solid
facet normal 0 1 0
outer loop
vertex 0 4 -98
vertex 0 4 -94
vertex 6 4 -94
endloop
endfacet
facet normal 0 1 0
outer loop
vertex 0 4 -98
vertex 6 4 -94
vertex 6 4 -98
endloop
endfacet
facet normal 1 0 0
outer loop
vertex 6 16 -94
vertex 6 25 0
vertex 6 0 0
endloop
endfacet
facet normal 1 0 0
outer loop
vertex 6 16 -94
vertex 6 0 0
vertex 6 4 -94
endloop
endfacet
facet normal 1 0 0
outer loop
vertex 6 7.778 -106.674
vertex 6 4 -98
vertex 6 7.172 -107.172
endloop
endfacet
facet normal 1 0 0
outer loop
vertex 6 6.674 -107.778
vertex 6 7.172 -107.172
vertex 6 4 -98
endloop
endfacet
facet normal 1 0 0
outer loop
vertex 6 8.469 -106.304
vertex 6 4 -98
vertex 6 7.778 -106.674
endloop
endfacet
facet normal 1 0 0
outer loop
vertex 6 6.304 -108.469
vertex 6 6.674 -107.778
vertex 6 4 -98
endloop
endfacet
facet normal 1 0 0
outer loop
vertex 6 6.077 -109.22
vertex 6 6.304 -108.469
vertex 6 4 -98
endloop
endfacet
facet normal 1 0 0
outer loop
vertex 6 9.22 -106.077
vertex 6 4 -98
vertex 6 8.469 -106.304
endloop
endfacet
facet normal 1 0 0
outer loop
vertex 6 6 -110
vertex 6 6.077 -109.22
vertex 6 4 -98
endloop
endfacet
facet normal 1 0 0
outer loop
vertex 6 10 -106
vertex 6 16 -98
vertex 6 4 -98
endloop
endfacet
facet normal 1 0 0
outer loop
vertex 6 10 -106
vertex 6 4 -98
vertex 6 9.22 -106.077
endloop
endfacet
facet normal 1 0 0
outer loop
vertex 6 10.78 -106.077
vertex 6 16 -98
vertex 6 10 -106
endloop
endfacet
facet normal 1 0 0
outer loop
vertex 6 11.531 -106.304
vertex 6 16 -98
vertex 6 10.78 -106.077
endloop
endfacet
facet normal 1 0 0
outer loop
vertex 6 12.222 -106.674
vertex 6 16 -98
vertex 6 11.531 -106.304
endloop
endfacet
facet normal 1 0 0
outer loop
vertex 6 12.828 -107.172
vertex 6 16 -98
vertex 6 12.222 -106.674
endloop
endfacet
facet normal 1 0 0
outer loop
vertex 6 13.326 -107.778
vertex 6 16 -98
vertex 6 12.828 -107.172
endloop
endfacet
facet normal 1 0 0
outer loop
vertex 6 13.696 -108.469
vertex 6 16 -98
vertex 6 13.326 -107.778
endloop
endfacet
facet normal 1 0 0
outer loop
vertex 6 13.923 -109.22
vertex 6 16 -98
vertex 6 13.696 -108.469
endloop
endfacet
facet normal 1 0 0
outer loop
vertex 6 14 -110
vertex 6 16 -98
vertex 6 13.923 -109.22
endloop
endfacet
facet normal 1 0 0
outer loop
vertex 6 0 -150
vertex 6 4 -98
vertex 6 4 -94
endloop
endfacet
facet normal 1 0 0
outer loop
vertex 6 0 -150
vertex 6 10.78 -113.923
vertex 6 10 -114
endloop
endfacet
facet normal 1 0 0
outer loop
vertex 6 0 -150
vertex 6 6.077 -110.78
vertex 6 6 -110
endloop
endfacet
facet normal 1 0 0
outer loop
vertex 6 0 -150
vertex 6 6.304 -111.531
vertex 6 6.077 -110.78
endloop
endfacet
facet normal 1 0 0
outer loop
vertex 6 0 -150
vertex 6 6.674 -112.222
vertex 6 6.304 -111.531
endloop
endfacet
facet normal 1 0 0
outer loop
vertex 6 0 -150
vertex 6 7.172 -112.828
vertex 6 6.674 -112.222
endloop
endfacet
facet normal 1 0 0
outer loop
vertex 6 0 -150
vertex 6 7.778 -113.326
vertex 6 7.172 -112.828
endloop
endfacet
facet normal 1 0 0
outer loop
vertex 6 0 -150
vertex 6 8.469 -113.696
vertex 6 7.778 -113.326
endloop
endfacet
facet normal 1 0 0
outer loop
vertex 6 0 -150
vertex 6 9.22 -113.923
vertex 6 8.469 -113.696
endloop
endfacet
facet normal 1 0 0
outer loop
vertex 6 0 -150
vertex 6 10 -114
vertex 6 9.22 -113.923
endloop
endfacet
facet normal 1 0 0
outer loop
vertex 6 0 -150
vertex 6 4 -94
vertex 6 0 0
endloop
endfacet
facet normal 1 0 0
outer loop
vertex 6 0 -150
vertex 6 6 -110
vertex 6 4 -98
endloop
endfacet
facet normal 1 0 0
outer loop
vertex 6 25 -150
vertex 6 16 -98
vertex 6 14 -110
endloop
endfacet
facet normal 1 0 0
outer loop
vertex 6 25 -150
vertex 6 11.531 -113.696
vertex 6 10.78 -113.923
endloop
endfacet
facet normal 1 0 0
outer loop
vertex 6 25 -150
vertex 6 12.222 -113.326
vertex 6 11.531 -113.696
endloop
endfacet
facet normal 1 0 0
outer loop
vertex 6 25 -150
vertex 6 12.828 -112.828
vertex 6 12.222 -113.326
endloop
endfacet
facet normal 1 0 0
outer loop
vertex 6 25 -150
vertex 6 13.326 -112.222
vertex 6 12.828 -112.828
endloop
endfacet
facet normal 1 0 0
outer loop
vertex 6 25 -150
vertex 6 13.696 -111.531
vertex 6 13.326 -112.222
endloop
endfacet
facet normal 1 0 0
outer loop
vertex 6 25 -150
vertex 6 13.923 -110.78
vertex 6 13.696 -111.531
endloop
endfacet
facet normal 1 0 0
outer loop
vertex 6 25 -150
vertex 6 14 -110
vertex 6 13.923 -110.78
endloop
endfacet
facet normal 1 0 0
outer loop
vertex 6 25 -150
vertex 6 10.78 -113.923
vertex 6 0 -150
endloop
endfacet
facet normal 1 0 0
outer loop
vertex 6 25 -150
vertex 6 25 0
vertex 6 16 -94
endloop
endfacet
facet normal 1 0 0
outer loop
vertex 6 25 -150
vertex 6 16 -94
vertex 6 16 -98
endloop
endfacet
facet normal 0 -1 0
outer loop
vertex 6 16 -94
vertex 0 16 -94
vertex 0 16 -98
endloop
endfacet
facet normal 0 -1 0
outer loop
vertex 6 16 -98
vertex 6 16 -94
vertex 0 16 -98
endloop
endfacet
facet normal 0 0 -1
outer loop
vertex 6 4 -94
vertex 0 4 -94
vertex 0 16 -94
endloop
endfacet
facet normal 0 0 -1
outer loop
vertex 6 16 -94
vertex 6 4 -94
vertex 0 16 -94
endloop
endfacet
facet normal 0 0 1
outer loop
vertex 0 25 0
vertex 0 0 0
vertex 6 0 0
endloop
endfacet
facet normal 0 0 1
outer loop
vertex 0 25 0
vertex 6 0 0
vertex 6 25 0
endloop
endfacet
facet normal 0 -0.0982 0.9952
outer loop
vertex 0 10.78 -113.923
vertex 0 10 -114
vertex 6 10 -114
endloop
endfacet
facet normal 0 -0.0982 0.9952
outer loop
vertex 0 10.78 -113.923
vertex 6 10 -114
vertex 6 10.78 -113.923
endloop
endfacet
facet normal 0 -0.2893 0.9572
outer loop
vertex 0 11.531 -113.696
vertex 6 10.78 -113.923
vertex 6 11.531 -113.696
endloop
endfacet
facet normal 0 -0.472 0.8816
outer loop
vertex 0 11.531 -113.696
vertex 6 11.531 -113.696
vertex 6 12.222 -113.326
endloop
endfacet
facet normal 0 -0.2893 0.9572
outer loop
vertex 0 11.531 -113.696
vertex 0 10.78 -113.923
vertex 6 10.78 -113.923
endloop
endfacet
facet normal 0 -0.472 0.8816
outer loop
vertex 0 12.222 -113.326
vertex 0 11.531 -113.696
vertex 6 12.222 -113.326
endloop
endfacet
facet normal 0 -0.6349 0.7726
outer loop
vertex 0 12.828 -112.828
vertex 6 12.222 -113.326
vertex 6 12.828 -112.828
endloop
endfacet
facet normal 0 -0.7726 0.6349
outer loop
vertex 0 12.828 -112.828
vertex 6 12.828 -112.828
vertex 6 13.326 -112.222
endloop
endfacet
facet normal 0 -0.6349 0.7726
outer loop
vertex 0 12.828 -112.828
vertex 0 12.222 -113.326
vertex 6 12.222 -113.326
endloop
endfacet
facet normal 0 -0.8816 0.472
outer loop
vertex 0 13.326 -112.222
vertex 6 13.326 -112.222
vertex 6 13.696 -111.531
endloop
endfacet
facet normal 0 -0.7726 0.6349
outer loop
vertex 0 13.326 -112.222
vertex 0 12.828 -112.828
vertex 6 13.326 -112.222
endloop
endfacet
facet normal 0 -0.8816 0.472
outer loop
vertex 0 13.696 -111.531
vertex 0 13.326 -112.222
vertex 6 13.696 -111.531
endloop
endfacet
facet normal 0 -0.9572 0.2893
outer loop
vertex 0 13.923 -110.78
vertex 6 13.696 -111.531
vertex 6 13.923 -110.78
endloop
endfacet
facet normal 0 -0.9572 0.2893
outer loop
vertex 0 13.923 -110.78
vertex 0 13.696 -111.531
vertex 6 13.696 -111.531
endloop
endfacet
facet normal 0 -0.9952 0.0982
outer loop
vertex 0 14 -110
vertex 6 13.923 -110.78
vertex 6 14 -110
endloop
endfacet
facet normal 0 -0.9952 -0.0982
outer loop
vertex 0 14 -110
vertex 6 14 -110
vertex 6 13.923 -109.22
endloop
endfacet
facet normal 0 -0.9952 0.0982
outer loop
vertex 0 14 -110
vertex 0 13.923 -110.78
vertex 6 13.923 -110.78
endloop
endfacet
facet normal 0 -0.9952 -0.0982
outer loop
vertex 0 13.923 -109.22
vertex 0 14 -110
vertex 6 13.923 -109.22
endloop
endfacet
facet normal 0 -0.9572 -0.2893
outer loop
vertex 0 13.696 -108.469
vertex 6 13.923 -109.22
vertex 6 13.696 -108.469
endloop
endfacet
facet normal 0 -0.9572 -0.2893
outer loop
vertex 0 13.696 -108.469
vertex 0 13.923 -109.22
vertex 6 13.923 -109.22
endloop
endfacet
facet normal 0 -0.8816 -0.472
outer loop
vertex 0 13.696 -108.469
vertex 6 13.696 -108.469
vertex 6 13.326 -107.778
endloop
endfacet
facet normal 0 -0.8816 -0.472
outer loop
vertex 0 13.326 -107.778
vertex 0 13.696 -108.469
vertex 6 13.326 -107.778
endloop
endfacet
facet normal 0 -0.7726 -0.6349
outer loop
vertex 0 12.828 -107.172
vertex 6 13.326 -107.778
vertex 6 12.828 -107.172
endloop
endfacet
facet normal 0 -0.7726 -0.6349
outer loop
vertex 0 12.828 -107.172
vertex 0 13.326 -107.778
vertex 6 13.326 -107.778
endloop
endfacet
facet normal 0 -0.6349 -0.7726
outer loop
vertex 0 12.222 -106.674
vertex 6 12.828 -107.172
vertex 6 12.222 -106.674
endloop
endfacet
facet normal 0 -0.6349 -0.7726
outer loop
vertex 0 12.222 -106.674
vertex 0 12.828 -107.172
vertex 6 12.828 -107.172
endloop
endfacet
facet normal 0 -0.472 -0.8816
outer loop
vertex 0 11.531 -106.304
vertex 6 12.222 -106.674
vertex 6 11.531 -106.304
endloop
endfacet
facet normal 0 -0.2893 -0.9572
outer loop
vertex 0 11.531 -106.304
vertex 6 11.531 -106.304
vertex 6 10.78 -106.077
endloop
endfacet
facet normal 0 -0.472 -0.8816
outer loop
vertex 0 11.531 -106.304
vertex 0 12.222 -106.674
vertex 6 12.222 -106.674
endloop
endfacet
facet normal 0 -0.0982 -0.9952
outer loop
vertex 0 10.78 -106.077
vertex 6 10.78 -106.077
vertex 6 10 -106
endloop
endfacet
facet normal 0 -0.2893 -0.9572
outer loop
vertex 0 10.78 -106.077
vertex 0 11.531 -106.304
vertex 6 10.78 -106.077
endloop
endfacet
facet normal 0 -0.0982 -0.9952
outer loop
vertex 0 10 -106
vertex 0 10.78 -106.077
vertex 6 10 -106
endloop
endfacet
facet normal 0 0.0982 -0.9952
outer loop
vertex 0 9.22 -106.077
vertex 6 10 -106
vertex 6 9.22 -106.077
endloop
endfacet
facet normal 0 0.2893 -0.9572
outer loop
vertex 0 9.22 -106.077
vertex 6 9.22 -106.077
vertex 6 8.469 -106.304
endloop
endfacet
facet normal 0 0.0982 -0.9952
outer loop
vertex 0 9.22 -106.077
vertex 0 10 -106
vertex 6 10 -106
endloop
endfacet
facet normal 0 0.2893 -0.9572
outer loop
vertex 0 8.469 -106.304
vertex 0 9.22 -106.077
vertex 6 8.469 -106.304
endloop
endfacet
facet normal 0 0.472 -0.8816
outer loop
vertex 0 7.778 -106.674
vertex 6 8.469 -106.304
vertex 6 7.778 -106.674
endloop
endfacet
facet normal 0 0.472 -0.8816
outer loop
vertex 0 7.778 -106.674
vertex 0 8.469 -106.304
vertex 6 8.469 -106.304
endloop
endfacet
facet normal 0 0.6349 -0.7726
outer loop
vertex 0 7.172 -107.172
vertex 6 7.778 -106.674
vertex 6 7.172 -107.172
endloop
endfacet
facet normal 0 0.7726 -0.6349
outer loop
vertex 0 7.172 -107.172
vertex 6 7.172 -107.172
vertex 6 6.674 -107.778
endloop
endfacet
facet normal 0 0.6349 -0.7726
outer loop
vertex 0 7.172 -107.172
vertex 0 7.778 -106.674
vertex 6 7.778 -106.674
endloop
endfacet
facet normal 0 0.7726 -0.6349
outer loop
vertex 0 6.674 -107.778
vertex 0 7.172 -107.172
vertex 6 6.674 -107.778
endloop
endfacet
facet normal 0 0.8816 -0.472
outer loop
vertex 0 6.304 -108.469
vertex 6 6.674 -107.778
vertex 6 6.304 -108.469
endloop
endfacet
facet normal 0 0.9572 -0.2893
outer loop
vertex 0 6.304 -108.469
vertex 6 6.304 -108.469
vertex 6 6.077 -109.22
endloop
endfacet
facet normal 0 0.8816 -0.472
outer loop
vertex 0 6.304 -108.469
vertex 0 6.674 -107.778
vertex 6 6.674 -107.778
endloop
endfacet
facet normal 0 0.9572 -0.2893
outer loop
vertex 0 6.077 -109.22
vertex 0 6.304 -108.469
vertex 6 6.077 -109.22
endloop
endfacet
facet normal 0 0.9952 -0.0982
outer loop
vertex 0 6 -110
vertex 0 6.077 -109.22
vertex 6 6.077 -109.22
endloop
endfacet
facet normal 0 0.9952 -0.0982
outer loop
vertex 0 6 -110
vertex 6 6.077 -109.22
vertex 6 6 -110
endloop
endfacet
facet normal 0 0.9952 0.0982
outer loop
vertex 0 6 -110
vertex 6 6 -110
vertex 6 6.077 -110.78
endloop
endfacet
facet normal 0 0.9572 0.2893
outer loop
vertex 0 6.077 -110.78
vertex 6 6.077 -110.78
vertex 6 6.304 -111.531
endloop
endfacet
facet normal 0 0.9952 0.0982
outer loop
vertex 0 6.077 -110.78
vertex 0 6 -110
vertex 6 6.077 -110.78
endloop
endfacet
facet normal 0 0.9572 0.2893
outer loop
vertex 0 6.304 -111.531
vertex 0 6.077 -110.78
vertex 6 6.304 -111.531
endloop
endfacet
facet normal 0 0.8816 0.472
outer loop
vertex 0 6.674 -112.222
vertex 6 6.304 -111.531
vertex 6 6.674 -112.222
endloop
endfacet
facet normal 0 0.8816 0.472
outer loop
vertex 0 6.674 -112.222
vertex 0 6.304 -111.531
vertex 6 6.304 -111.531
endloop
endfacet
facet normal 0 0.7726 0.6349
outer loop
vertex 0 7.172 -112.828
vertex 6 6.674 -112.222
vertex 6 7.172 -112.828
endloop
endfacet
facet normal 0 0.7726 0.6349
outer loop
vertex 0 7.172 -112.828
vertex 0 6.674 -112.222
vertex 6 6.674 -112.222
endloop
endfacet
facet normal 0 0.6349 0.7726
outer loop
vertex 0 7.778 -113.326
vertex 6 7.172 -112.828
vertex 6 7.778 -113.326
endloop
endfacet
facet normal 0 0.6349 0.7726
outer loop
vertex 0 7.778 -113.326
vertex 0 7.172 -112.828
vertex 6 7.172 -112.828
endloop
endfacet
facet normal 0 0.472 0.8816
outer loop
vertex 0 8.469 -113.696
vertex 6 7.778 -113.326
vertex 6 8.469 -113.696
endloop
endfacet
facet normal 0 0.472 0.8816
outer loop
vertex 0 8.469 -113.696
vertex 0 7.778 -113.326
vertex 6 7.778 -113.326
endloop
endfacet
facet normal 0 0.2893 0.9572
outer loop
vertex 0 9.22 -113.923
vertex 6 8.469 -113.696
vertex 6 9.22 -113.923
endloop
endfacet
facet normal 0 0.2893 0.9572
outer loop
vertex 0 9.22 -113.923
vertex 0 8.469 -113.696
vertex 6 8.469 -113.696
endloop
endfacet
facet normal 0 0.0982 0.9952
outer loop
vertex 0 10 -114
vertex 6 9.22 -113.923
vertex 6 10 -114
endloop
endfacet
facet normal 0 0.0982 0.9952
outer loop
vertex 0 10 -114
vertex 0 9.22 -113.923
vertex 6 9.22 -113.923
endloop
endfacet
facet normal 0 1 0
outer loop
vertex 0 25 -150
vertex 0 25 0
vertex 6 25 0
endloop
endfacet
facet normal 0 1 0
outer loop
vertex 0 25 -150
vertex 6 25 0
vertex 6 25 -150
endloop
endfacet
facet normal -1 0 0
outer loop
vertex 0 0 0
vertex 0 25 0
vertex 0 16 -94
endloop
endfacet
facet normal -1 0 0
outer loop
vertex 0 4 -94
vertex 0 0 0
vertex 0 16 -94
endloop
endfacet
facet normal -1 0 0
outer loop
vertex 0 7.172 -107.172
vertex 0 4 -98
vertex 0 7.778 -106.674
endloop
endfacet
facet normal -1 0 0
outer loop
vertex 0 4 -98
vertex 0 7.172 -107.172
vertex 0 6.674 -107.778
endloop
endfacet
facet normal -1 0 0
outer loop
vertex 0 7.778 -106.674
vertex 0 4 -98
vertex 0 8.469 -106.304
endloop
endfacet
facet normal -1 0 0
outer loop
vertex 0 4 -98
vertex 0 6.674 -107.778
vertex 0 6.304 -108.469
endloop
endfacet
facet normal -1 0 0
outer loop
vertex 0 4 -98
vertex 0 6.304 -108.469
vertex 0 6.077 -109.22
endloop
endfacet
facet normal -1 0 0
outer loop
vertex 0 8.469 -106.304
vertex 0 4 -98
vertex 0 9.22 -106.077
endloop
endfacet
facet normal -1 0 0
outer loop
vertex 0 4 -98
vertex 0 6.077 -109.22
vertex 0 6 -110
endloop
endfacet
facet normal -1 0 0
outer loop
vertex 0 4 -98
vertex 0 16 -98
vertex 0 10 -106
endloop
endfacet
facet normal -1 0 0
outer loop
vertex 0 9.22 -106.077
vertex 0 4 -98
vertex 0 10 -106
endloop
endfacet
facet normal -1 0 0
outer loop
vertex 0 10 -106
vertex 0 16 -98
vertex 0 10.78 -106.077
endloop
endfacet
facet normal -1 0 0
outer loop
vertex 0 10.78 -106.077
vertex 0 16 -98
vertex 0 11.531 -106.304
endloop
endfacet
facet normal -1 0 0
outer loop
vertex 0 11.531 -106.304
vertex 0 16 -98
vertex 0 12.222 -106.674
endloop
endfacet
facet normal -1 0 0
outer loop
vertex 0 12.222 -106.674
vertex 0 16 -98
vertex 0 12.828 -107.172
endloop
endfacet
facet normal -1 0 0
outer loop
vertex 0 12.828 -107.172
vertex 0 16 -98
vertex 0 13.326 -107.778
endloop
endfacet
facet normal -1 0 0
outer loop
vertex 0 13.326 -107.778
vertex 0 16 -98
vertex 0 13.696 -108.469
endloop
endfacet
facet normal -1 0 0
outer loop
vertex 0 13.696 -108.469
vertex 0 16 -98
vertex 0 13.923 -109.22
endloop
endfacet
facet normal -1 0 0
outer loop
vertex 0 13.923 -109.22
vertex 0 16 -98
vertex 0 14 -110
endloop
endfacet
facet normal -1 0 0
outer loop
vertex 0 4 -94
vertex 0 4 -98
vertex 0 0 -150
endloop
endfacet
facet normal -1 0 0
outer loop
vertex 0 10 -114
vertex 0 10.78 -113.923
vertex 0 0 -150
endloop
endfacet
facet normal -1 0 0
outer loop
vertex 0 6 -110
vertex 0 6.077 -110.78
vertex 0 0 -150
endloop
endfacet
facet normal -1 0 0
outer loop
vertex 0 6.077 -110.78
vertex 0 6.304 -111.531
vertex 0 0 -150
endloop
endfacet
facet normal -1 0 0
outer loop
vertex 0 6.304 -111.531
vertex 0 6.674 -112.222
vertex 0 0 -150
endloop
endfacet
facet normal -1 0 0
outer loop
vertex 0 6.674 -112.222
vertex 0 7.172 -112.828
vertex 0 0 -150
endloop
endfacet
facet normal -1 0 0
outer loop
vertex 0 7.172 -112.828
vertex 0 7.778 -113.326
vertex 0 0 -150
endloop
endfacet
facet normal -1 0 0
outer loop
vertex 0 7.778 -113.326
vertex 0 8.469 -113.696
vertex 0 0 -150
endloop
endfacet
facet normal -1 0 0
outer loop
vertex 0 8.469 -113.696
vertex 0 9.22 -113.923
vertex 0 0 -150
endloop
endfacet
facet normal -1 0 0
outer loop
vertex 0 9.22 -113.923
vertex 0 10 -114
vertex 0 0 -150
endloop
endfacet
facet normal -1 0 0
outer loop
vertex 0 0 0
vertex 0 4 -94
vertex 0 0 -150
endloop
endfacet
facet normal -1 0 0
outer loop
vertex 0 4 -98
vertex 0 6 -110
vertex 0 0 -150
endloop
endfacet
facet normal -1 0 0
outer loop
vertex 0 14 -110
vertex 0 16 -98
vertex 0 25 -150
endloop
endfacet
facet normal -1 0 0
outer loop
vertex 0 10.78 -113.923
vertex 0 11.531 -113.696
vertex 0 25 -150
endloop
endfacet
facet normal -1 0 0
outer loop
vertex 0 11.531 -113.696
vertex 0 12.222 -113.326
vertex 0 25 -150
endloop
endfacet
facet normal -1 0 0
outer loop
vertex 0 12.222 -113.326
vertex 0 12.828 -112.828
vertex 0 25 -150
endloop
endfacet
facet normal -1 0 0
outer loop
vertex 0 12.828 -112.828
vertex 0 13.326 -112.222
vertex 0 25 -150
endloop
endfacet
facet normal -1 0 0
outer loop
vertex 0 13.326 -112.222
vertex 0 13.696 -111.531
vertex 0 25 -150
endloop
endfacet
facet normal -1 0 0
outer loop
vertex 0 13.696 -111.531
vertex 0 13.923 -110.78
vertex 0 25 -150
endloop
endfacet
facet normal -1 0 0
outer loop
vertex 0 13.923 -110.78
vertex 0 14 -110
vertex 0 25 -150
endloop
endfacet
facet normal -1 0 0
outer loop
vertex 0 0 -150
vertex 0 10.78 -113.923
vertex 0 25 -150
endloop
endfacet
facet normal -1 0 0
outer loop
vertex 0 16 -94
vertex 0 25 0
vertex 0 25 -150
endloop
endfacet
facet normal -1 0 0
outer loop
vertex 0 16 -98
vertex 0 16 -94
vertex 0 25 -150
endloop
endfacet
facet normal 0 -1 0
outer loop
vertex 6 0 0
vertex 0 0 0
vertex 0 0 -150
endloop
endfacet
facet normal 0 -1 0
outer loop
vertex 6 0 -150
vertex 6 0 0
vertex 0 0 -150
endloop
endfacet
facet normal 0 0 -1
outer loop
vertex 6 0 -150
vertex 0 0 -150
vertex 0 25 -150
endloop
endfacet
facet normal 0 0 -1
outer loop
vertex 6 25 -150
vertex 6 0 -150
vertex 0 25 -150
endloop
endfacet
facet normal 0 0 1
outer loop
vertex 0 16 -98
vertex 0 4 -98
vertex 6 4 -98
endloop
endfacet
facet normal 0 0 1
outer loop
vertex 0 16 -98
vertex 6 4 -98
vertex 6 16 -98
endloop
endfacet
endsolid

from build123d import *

# Parameters (mm, degrees)
SKETCH1_W           = 150
SKETCH1_H           = 25
SKETCH1_R           = 4
SKETCH1_W_2         = 4
SKETCH1_H_2         = 12
BOSS_EXTRUDE1_DEPTH = 6


with BuildPart() as part:
    # Sketch1 → Boss-Extrude1 (new body)
    with BuildSketch(Plane(origin=(0, 0, 0), x_dir=(0, 0, -1), z_dir=(1, 0, 0))):
        with Locations((75, 12.5)):
            Rectangle(SKETCH1_W, SKETCH1_H)
        with Locations((110, 10)):
            Circle(SKETCH1_R, mode=Mode.SUBTRACT)
        with Locations((96, 10)):
            Rectangle(SKETCH1_W_2, SKETCH1_H_2, mode=Mode.SUBTRACT)
    extrude(amount=BOSS_EXTRUDE1_DEPTH)


solid = part.part
